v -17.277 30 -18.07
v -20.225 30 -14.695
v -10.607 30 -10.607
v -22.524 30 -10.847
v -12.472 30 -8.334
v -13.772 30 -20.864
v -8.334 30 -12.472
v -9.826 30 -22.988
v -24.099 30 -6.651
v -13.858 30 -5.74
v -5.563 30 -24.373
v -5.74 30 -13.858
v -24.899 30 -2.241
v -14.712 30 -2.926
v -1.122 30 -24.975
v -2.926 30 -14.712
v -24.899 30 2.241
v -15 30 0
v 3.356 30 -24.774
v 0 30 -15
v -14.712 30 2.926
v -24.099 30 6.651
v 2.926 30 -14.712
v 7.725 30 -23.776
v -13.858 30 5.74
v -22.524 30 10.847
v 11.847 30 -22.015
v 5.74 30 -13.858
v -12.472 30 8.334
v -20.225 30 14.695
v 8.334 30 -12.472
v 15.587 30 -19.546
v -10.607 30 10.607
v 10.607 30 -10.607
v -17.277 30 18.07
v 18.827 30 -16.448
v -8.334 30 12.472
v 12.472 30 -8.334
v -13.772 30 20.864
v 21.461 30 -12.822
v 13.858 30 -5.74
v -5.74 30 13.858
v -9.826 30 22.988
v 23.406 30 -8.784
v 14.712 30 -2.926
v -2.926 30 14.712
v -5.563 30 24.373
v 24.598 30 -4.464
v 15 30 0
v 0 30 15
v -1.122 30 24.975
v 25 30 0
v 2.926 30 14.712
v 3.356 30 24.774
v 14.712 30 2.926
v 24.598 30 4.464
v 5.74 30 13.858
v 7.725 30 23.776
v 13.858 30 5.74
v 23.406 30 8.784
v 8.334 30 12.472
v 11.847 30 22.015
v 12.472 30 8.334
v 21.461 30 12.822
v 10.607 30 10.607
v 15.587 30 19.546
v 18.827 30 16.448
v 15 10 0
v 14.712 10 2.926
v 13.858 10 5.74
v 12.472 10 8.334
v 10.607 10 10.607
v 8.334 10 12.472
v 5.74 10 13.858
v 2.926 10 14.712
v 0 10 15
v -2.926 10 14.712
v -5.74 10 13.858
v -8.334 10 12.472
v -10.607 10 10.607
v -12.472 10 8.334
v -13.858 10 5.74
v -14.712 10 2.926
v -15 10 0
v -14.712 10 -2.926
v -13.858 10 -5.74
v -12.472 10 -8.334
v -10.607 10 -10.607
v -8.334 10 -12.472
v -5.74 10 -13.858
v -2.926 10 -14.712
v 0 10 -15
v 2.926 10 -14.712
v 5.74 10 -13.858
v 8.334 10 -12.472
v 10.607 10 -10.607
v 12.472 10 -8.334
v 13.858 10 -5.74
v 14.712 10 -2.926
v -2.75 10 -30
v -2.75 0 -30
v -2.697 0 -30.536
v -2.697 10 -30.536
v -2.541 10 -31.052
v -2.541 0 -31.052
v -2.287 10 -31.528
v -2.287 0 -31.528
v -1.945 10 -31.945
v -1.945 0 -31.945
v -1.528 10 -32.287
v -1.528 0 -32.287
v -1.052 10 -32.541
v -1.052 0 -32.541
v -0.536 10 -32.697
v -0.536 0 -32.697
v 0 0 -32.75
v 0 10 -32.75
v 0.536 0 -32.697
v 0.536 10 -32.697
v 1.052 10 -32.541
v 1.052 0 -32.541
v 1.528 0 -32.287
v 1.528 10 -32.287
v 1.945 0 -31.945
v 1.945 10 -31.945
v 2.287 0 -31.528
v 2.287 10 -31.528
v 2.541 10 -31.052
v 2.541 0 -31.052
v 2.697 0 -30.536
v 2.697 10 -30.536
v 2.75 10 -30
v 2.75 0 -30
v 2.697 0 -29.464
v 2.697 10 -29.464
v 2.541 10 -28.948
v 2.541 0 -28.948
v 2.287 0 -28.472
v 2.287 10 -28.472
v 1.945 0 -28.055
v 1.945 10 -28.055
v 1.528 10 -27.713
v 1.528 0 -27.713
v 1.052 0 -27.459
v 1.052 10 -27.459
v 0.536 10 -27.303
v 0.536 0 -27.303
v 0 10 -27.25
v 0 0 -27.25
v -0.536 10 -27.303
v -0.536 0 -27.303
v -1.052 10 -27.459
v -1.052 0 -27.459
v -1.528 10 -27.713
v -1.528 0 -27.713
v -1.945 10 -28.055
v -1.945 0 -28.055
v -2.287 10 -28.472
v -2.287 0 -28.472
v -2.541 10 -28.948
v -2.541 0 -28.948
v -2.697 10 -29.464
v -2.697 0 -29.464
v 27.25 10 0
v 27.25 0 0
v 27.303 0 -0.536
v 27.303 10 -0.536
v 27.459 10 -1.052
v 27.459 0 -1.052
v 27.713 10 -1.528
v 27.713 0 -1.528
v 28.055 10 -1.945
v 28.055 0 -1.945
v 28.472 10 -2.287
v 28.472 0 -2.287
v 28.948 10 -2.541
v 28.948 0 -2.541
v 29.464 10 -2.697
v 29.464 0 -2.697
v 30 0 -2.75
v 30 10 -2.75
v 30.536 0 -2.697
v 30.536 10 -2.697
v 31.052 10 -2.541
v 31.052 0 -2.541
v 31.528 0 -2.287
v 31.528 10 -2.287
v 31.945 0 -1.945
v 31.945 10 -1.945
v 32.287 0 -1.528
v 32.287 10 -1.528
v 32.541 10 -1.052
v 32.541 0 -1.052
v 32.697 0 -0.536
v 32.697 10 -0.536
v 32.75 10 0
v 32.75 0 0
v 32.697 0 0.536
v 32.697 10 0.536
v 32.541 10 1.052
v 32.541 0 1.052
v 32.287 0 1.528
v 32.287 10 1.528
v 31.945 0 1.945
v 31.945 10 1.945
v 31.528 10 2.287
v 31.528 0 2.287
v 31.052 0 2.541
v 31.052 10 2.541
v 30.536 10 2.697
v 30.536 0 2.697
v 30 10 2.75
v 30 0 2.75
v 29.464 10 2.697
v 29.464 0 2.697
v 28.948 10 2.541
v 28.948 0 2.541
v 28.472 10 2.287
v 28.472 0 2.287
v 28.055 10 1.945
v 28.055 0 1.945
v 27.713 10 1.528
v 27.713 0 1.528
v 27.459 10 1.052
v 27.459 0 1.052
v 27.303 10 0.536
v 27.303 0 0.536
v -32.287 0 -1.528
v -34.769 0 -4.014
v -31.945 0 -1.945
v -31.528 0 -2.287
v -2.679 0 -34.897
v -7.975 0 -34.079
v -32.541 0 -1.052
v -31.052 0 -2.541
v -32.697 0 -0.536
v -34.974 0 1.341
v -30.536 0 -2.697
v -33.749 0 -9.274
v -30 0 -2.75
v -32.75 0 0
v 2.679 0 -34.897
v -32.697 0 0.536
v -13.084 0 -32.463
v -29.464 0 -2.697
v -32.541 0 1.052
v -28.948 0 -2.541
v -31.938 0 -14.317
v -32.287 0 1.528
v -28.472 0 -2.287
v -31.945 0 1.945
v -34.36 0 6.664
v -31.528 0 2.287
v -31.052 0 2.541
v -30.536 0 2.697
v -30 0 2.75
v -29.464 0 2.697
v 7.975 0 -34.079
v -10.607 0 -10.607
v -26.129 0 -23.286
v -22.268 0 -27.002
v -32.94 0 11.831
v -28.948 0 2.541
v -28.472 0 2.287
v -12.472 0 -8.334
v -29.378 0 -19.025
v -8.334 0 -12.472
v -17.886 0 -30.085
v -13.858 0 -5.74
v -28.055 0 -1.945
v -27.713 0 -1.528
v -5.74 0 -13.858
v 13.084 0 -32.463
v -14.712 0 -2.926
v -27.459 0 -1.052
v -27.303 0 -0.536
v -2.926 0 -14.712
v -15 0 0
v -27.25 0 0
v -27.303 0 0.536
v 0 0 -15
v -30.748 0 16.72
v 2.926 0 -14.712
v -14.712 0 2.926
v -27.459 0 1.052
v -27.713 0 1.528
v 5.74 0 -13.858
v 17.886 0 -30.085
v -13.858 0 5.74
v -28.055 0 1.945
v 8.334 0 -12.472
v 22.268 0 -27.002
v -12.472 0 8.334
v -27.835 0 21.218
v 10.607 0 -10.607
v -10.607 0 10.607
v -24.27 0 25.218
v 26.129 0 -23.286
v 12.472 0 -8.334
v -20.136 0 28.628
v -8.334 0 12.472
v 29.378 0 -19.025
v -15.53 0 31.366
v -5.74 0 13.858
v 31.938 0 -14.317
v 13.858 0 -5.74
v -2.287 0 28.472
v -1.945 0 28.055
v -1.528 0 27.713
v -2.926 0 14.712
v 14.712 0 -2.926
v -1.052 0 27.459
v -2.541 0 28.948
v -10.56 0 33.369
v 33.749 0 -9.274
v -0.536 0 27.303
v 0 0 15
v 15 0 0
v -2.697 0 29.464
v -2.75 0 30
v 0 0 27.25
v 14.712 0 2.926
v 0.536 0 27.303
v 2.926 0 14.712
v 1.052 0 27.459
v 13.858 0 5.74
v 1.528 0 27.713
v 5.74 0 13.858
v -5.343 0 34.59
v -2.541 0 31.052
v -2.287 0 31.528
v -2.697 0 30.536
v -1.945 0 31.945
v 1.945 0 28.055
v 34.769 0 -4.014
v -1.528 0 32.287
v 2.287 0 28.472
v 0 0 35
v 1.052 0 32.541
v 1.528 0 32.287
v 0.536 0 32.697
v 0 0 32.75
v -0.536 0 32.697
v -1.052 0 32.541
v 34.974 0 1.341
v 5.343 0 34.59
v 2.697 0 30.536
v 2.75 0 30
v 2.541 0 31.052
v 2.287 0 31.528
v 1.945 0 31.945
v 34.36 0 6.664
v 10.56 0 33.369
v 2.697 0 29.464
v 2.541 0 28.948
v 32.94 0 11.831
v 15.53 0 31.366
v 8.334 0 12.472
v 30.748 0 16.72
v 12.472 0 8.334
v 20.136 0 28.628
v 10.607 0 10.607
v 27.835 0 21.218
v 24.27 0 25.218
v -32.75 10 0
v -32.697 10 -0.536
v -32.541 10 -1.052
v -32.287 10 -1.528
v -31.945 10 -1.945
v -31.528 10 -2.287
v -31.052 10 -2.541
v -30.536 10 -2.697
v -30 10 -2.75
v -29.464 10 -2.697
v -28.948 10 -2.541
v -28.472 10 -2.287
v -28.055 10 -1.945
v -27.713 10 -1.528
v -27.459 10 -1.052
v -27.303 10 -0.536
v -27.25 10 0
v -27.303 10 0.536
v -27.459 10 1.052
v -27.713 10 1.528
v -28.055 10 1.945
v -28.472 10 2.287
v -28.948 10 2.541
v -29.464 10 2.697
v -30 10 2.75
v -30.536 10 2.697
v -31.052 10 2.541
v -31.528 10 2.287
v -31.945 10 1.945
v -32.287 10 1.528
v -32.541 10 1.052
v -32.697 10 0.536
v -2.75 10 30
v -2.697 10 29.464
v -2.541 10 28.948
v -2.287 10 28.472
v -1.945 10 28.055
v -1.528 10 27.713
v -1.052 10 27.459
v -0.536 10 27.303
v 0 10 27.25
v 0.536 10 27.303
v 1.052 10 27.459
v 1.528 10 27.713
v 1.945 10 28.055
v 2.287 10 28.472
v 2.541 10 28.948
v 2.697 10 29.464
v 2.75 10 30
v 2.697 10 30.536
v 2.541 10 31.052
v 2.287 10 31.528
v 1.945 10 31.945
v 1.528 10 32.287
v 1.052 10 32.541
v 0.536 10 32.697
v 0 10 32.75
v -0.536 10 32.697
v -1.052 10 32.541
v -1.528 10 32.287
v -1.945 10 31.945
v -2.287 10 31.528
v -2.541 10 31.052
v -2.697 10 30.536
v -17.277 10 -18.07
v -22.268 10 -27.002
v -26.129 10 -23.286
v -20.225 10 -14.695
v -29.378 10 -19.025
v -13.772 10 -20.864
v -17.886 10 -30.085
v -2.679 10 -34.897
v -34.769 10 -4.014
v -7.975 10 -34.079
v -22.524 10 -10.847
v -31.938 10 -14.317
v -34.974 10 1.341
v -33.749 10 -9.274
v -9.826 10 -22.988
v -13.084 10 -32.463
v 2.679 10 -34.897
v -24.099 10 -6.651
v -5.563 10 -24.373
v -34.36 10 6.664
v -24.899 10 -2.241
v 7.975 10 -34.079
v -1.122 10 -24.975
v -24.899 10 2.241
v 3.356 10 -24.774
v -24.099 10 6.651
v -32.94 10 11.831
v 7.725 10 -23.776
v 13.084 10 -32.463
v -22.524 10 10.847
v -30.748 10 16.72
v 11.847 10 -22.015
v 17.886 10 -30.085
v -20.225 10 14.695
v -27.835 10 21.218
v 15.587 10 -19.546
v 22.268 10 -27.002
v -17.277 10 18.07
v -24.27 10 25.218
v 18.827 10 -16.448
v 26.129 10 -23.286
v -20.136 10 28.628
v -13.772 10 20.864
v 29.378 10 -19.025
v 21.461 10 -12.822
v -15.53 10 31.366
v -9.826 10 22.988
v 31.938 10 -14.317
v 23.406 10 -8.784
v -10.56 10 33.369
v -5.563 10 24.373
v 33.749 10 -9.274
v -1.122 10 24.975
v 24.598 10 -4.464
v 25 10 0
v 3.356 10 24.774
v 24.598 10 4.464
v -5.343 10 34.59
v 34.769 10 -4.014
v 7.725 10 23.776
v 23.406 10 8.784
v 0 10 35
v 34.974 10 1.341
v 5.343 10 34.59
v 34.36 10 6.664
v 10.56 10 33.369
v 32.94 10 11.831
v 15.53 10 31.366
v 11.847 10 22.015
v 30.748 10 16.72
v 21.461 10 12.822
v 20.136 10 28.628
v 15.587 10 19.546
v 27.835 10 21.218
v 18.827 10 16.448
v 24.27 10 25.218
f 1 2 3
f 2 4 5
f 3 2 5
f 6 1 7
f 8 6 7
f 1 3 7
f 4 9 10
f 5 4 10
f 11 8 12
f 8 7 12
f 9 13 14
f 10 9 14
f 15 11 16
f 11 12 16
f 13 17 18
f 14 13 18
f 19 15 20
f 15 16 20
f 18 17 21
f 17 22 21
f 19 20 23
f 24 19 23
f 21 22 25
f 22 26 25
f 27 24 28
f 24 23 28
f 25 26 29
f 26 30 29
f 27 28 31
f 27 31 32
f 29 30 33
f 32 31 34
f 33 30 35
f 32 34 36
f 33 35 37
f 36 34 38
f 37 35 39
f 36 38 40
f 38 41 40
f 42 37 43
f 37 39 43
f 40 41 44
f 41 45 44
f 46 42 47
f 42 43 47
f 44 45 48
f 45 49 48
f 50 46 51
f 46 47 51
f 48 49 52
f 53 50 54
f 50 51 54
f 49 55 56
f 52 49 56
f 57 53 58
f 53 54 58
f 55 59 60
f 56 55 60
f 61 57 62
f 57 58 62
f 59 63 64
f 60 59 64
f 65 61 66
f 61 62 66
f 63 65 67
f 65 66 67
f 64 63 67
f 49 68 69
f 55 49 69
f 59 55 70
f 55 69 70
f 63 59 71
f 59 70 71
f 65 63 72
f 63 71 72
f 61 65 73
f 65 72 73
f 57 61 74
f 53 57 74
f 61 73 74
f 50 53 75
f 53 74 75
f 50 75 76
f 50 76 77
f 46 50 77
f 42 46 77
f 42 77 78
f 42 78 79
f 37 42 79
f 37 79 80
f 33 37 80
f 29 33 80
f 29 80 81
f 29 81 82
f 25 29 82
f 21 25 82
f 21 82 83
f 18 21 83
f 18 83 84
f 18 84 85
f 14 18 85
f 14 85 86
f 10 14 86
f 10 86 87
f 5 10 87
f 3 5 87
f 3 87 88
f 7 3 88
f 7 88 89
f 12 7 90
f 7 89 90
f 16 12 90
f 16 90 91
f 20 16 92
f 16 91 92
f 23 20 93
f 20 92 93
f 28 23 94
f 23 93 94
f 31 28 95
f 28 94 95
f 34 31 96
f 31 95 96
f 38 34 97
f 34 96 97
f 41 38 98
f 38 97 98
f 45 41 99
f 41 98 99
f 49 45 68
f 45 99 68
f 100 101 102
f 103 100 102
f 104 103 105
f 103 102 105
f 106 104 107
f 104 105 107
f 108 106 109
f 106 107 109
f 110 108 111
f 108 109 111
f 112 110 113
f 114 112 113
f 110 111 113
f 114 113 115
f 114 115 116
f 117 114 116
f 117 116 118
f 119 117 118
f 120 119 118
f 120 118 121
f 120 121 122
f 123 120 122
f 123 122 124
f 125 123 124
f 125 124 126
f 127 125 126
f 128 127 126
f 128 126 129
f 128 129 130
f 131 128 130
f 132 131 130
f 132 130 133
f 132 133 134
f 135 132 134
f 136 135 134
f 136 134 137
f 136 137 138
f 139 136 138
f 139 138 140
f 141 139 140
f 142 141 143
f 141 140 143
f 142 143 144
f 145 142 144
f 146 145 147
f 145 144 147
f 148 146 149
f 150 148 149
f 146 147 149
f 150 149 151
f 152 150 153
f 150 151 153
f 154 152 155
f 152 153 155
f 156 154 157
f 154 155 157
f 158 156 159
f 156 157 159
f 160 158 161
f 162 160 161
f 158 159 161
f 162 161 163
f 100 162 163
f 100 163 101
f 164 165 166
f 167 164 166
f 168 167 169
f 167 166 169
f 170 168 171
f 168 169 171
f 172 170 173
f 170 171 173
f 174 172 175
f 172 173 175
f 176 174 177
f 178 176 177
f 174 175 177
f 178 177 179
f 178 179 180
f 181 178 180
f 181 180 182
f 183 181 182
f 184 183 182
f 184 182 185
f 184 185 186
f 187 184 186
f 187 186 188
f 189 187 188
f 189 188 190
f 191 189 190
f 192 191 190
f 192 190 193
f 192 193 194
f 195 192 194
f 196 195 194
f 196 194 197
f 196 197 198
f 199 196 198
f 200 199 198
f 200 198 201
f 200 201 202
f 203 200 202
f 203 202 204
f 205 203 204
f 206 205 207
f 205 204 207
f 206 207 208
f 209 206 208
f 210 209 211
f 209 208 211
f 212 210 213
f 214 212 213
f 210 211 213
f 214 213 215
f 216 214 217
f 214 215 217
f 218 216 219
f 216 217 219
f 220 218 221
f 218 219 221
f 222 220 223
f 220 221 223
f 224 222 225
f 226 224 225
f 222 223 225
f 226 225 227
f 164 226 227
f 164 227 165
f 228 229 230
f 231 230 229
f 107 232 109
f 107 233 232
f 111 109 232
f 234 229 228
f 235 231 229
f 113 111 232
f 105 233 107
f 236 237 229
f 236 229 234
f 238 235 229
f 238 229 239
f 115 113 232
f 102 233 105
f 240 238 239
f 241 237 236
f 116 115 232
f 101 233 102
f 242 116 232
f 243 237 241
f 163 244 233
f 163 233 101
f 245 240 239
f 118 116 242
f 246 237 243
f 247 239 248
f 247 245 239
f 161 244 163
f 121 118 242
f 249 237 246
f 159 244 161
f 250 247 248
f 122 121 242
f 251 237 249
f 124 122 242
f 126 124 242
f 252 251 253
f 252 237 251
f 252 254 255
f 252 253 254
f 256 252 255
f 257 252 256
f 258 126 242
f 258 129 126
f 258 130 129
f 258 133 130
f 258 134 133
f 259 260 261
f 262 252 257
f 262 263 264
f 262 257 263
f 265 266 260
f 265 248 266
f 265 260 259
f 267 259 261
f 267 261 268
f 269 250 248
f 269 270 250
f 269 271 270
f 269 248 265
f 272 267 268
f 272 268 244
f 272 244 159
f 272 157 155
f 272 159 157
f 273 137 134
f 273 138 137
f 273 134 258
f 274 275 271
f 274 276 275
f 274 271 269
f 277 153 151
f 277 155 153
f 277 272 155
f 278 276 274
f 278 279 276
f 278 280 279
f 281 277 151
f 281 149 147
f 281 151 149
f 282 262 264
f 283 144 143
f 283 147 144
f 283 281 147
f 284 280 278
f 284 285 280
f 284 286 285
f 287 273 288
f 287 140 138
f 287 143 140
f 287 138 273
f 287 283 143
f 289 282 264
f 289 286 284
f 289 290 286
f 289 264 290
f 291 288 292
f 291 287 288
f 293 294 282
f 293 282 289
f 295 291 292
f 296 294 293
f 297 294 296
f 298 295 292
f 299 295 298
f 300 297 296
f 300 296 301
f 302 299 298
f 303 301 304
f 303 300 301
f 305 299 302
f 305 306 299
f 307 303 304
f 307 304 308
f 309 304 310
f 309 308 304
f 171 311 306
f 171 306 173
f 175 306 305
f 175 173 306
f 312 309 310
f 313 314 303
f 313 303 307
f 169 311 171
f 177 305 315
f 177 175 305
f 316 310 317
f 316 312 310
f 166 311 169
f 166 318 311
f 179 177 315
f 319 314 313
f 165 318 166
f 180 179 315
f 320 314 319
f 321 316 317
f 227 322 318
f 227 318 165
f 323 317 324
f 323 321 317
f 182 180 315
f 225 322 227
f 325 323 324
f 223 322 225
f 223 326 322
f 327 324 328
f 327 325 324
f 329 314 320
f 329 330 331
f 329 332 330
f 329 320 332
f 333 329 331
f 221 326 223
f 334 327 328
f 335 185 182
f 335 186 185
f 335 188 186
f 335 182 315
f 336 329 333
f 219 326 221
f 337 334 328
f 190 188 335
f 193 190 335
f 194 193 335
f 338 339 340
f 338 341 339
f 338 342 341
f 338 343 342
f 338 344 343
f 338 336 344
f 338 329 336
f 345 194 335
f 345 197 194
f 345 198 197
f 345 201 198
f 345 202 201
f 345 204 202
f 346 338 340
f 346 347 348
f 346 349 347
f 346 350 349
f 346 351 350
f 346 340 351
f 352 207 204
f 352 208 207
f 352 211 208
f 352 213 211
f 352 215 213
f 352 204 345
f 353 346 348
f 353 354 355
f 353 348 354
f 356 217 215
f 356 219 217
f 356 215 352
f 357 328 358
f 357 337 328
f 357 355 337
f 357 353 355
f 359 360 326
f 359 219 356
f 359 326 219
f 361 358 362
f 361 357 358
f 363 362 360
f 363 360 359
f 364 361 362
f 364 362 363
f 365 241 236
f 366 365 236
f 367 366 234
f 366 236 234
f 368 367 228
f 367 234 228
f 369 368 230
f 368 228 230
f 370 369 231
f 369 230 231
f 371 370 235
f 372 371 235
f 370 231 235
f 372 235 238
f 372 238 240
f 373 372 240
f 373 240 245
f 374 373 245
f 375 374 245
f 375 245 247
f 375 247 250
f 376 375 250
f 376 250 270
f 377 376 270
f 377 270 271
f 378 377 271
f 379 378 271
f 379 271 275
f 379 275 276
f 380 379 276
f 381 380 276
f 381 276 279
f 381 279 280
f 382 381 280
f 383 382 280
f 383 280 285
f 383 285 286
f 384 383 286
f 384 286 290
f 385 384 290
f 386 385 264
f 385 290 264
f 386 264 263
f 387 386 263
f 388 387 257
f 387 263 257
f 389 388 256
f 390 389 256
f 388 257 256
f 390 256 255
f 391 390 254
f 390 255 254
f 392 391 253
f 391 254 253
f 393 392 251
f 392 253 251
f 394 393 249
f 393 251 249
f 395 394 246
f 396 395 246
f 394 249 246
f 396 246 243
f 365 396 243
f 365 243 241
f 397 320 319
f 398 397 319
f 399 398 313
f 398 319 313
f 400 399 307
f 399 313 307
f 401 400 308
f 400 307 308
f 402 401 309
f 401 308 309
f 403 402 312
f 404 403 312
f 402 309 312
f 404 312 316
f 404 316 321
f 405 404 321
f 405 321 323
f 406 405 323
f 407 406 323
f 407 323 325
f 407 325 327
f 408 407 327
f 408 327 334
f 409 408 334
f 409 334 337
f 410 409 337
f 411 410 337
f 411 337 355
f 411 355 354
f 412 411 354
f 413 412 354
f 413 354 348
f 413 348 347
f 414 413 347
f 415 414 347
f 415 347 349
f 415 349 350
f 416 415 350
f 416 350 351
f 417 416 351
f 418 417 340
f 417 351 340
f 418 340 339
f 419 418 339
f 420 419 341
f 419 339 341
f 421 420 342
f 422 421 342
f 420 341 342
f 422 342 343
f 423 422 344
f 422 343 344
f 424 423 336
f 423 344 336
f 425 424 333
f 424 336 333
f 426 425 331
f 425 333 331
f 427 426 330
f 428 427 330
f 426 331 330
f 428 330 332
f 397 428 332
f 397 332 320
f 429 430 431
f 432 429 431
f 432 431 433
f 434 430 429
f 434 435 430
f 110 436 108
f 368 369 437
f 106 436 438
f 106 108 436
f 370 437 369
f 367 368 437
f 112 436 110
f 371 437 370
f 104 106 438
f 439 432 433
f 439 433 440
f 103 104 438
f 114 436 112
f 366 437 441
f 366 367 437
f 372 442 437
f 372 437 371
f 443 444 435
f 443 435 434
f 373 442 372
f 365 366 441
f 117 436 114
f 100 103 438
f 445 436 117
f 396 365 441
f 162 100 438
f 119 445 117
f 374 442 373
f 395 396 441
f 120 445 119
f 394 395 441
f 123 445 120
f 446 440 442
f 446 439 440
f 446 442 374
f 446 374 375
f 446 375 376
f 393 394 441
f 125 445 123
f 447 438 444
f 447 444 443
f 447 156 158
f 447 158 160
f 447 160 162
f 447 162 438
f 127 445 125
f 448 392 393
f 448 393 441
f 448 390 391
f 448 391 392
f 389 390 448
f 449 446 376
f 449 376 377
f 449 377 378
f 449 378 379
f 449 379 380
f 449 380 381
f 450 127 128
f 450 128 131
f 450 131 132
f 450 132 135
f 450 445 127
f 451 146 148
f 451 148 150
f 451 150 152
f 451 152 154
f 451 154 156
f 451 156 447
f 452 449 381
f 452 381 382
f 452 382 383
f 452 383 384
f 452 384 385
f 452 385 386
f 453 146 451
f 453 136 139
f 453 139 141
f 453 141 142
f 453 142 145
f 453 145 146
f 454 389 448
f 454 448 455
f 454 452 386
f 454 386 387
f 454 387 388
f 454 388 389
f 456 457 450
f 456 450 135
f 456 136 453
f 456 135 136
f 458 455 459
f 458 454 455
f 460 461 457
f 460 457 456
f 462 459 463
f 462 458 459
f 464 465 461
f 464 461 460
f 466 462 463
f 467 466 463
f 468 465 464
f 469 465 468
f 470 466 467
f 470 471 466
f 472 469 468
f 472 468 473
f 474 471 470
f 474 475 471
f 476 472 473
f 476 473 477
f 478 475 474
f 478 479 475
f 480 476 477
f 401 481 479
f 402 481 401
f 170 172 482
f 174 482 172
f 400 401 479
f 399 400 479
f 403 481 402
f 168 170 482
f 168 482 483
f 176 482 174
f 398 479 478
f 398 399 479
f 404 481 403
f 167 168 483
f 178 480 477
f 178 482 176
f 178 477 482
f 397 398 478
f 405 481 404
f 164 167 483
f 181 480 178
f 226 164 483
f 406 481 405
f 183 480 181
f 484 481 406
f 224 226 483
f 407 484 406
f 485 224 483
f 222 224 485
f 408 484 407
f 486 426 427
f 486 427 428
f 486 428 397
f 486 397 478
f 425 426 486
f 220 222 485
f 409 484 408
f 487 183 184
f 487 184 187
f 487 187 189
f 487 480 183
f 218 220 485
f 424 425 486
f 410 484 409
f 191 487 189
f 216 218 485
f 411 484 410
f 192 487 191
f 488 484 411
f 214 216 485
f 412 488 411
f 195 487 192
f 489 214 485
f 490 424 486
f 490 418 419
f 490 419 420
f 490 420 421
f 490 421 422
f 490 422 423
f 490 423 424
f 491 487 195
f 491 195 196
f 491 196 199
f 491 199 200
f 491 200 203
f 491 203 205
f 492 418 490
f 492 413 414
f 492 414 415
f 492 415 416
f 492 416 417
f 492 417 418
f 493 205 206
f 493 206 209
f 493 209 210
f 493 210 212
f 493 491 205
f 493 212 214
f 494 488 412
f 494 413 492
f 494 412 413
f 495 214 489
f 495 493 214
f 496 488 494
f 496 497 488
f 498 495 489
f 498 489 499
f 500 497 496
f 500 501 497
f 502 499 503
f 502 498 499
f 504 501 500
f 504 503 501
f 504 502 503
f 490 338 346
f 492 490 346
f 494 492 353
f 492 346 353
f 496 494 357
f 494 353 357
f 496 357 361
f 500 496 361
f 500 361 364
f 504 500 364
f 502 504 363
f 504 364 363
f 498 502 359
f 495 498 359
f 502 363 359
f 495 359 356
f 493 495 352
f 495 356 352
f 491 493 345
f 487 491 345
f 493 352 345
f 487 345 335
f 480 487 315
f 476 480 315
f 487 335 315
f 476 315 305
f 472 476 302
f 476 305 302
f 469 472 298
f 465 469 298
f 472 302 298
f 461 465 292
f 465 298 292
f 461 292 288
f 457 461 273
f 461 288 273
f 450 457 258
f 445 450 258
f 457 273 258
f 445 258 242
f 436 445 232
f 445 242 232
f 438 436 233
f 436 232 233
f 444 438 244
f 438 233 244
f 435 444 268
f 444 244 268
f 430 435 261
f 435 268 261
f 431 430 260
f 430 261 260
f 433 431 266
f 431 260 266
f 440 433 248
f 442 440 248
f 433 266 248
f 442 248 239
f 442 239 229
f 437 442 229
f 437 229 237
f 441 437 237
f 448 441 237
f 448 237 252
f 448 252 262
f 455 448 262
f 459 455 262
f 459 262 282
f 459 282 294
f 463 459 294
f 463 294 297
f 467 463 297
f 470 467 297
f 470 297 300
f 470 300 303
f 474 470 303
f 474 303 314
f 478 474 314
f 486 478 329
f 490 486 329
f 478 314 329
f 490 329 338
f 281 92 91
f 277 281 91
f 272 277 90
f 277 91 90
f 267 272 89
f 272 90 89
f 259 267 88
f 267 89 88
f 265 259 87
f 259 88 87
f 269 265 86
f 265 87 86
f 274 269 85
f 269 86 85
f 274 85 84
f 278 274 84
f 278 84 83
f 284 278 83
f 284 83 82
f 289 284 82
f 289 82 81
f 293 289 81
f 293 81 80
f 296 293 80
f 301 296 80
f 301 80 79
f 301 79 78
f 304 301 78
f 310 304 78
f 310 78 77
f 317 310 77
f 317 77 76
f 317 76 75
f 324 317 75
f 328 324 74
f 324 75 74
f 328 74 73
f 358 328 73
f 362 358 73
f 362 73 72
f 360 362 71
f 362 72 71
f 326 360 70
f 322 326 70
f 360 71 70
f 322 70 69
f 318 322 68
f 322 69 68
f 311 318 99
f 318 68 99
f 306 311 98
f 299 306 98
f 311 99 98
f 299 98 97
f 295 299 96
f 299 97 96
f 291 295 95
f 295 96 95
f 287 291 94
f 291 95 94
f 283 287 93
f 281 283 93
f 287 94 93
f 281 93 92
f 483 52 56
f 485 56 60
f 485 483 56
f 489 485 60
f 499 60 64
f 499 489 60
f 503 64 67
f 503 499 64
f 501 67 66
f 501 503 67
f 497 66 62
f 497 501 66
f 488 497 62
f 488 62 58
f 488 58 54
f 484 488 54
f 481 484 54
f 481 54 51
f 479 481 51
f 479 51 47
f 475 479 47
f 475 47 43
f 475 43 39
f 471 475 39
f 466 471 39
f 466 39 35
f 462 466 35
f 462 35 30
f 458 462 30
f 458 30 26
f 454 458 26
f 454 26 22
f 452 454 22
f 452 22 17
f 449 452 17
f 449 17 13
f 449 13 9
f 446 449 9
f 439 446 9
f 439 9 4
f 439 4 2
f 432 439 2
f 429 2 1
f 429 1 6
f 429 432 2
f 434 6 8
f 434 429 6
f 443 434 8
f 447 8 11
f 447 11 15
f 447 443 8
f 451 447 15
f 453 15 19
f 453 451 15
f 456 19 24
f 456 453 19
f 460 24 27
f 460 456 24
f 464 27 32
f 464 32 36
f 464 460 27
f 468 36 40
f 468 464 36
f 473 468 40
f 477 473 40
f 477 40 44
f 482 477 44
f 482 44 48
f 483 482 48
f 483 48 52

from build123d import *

# Parameters (mm, degrees)
SKETCH_1_R          = 35
EXTRUDE_1_DEPTH     = 10
SKETCH_4_R          = 25
SKETCH_4_R_2        = 15
EXTRUDE_1_2_DEPTH   = 30
HOLE_WIZARD_1_D     = 5.5
SKETCH_7_R          = 15
CUT_EXTRUDE_1_DEPTH = 54.38539126


with BuildPart() as part:
    # 草图1 → Extrude 1 (new body)
    with BuildSketch(Plane(origin=(0, 0, 0), x_dir=(1, 0, 0), z_dir=(0, 1, 0))):
        with Locations(Location((0, 0, 0), (0, 0, 270))):
            Circle(SKETCH_1_R)
    extrude(amount=EXTRUDE_1_DEPTH)

    # 草图4 → Extrude 1 2 (add)
    with BuildSketch(Plane.XZ):
        Circle(SKETCH_4_R)
        Circle(SKETCH_4_R_2, mode=Mode.SUBTRACT)
    extrude(amount=-EXTRUDE_1_2_DEPTH)

    # 孔1 (through all)
    with Locations(Plane(origin=(0, 10, 0), x_dir=(1, 0, 0), z_dir=(0, 1, 0))):
        with Locations((0, 30), (30, 0), (0, -30), (-30, 0)):
            Hole(HOLE_WIZARD_1_D / 2)

    # 草图7 → 切除-拉伸1 (cut, through all)
    with BuildSketch(Plane(origin=(0, 10, 0), x_dir=(1, 0, 0), z_dir=(0, 1, 0))):
        with Locations(Location((0, 0, 0), (0, 0, 90))):
            Circle(SKETCH_7_R)
    extrude(amount=-CUT_EXTRUDE_1_DEPTH, mode=Mode.SUBTRACT)


solid = part.part
